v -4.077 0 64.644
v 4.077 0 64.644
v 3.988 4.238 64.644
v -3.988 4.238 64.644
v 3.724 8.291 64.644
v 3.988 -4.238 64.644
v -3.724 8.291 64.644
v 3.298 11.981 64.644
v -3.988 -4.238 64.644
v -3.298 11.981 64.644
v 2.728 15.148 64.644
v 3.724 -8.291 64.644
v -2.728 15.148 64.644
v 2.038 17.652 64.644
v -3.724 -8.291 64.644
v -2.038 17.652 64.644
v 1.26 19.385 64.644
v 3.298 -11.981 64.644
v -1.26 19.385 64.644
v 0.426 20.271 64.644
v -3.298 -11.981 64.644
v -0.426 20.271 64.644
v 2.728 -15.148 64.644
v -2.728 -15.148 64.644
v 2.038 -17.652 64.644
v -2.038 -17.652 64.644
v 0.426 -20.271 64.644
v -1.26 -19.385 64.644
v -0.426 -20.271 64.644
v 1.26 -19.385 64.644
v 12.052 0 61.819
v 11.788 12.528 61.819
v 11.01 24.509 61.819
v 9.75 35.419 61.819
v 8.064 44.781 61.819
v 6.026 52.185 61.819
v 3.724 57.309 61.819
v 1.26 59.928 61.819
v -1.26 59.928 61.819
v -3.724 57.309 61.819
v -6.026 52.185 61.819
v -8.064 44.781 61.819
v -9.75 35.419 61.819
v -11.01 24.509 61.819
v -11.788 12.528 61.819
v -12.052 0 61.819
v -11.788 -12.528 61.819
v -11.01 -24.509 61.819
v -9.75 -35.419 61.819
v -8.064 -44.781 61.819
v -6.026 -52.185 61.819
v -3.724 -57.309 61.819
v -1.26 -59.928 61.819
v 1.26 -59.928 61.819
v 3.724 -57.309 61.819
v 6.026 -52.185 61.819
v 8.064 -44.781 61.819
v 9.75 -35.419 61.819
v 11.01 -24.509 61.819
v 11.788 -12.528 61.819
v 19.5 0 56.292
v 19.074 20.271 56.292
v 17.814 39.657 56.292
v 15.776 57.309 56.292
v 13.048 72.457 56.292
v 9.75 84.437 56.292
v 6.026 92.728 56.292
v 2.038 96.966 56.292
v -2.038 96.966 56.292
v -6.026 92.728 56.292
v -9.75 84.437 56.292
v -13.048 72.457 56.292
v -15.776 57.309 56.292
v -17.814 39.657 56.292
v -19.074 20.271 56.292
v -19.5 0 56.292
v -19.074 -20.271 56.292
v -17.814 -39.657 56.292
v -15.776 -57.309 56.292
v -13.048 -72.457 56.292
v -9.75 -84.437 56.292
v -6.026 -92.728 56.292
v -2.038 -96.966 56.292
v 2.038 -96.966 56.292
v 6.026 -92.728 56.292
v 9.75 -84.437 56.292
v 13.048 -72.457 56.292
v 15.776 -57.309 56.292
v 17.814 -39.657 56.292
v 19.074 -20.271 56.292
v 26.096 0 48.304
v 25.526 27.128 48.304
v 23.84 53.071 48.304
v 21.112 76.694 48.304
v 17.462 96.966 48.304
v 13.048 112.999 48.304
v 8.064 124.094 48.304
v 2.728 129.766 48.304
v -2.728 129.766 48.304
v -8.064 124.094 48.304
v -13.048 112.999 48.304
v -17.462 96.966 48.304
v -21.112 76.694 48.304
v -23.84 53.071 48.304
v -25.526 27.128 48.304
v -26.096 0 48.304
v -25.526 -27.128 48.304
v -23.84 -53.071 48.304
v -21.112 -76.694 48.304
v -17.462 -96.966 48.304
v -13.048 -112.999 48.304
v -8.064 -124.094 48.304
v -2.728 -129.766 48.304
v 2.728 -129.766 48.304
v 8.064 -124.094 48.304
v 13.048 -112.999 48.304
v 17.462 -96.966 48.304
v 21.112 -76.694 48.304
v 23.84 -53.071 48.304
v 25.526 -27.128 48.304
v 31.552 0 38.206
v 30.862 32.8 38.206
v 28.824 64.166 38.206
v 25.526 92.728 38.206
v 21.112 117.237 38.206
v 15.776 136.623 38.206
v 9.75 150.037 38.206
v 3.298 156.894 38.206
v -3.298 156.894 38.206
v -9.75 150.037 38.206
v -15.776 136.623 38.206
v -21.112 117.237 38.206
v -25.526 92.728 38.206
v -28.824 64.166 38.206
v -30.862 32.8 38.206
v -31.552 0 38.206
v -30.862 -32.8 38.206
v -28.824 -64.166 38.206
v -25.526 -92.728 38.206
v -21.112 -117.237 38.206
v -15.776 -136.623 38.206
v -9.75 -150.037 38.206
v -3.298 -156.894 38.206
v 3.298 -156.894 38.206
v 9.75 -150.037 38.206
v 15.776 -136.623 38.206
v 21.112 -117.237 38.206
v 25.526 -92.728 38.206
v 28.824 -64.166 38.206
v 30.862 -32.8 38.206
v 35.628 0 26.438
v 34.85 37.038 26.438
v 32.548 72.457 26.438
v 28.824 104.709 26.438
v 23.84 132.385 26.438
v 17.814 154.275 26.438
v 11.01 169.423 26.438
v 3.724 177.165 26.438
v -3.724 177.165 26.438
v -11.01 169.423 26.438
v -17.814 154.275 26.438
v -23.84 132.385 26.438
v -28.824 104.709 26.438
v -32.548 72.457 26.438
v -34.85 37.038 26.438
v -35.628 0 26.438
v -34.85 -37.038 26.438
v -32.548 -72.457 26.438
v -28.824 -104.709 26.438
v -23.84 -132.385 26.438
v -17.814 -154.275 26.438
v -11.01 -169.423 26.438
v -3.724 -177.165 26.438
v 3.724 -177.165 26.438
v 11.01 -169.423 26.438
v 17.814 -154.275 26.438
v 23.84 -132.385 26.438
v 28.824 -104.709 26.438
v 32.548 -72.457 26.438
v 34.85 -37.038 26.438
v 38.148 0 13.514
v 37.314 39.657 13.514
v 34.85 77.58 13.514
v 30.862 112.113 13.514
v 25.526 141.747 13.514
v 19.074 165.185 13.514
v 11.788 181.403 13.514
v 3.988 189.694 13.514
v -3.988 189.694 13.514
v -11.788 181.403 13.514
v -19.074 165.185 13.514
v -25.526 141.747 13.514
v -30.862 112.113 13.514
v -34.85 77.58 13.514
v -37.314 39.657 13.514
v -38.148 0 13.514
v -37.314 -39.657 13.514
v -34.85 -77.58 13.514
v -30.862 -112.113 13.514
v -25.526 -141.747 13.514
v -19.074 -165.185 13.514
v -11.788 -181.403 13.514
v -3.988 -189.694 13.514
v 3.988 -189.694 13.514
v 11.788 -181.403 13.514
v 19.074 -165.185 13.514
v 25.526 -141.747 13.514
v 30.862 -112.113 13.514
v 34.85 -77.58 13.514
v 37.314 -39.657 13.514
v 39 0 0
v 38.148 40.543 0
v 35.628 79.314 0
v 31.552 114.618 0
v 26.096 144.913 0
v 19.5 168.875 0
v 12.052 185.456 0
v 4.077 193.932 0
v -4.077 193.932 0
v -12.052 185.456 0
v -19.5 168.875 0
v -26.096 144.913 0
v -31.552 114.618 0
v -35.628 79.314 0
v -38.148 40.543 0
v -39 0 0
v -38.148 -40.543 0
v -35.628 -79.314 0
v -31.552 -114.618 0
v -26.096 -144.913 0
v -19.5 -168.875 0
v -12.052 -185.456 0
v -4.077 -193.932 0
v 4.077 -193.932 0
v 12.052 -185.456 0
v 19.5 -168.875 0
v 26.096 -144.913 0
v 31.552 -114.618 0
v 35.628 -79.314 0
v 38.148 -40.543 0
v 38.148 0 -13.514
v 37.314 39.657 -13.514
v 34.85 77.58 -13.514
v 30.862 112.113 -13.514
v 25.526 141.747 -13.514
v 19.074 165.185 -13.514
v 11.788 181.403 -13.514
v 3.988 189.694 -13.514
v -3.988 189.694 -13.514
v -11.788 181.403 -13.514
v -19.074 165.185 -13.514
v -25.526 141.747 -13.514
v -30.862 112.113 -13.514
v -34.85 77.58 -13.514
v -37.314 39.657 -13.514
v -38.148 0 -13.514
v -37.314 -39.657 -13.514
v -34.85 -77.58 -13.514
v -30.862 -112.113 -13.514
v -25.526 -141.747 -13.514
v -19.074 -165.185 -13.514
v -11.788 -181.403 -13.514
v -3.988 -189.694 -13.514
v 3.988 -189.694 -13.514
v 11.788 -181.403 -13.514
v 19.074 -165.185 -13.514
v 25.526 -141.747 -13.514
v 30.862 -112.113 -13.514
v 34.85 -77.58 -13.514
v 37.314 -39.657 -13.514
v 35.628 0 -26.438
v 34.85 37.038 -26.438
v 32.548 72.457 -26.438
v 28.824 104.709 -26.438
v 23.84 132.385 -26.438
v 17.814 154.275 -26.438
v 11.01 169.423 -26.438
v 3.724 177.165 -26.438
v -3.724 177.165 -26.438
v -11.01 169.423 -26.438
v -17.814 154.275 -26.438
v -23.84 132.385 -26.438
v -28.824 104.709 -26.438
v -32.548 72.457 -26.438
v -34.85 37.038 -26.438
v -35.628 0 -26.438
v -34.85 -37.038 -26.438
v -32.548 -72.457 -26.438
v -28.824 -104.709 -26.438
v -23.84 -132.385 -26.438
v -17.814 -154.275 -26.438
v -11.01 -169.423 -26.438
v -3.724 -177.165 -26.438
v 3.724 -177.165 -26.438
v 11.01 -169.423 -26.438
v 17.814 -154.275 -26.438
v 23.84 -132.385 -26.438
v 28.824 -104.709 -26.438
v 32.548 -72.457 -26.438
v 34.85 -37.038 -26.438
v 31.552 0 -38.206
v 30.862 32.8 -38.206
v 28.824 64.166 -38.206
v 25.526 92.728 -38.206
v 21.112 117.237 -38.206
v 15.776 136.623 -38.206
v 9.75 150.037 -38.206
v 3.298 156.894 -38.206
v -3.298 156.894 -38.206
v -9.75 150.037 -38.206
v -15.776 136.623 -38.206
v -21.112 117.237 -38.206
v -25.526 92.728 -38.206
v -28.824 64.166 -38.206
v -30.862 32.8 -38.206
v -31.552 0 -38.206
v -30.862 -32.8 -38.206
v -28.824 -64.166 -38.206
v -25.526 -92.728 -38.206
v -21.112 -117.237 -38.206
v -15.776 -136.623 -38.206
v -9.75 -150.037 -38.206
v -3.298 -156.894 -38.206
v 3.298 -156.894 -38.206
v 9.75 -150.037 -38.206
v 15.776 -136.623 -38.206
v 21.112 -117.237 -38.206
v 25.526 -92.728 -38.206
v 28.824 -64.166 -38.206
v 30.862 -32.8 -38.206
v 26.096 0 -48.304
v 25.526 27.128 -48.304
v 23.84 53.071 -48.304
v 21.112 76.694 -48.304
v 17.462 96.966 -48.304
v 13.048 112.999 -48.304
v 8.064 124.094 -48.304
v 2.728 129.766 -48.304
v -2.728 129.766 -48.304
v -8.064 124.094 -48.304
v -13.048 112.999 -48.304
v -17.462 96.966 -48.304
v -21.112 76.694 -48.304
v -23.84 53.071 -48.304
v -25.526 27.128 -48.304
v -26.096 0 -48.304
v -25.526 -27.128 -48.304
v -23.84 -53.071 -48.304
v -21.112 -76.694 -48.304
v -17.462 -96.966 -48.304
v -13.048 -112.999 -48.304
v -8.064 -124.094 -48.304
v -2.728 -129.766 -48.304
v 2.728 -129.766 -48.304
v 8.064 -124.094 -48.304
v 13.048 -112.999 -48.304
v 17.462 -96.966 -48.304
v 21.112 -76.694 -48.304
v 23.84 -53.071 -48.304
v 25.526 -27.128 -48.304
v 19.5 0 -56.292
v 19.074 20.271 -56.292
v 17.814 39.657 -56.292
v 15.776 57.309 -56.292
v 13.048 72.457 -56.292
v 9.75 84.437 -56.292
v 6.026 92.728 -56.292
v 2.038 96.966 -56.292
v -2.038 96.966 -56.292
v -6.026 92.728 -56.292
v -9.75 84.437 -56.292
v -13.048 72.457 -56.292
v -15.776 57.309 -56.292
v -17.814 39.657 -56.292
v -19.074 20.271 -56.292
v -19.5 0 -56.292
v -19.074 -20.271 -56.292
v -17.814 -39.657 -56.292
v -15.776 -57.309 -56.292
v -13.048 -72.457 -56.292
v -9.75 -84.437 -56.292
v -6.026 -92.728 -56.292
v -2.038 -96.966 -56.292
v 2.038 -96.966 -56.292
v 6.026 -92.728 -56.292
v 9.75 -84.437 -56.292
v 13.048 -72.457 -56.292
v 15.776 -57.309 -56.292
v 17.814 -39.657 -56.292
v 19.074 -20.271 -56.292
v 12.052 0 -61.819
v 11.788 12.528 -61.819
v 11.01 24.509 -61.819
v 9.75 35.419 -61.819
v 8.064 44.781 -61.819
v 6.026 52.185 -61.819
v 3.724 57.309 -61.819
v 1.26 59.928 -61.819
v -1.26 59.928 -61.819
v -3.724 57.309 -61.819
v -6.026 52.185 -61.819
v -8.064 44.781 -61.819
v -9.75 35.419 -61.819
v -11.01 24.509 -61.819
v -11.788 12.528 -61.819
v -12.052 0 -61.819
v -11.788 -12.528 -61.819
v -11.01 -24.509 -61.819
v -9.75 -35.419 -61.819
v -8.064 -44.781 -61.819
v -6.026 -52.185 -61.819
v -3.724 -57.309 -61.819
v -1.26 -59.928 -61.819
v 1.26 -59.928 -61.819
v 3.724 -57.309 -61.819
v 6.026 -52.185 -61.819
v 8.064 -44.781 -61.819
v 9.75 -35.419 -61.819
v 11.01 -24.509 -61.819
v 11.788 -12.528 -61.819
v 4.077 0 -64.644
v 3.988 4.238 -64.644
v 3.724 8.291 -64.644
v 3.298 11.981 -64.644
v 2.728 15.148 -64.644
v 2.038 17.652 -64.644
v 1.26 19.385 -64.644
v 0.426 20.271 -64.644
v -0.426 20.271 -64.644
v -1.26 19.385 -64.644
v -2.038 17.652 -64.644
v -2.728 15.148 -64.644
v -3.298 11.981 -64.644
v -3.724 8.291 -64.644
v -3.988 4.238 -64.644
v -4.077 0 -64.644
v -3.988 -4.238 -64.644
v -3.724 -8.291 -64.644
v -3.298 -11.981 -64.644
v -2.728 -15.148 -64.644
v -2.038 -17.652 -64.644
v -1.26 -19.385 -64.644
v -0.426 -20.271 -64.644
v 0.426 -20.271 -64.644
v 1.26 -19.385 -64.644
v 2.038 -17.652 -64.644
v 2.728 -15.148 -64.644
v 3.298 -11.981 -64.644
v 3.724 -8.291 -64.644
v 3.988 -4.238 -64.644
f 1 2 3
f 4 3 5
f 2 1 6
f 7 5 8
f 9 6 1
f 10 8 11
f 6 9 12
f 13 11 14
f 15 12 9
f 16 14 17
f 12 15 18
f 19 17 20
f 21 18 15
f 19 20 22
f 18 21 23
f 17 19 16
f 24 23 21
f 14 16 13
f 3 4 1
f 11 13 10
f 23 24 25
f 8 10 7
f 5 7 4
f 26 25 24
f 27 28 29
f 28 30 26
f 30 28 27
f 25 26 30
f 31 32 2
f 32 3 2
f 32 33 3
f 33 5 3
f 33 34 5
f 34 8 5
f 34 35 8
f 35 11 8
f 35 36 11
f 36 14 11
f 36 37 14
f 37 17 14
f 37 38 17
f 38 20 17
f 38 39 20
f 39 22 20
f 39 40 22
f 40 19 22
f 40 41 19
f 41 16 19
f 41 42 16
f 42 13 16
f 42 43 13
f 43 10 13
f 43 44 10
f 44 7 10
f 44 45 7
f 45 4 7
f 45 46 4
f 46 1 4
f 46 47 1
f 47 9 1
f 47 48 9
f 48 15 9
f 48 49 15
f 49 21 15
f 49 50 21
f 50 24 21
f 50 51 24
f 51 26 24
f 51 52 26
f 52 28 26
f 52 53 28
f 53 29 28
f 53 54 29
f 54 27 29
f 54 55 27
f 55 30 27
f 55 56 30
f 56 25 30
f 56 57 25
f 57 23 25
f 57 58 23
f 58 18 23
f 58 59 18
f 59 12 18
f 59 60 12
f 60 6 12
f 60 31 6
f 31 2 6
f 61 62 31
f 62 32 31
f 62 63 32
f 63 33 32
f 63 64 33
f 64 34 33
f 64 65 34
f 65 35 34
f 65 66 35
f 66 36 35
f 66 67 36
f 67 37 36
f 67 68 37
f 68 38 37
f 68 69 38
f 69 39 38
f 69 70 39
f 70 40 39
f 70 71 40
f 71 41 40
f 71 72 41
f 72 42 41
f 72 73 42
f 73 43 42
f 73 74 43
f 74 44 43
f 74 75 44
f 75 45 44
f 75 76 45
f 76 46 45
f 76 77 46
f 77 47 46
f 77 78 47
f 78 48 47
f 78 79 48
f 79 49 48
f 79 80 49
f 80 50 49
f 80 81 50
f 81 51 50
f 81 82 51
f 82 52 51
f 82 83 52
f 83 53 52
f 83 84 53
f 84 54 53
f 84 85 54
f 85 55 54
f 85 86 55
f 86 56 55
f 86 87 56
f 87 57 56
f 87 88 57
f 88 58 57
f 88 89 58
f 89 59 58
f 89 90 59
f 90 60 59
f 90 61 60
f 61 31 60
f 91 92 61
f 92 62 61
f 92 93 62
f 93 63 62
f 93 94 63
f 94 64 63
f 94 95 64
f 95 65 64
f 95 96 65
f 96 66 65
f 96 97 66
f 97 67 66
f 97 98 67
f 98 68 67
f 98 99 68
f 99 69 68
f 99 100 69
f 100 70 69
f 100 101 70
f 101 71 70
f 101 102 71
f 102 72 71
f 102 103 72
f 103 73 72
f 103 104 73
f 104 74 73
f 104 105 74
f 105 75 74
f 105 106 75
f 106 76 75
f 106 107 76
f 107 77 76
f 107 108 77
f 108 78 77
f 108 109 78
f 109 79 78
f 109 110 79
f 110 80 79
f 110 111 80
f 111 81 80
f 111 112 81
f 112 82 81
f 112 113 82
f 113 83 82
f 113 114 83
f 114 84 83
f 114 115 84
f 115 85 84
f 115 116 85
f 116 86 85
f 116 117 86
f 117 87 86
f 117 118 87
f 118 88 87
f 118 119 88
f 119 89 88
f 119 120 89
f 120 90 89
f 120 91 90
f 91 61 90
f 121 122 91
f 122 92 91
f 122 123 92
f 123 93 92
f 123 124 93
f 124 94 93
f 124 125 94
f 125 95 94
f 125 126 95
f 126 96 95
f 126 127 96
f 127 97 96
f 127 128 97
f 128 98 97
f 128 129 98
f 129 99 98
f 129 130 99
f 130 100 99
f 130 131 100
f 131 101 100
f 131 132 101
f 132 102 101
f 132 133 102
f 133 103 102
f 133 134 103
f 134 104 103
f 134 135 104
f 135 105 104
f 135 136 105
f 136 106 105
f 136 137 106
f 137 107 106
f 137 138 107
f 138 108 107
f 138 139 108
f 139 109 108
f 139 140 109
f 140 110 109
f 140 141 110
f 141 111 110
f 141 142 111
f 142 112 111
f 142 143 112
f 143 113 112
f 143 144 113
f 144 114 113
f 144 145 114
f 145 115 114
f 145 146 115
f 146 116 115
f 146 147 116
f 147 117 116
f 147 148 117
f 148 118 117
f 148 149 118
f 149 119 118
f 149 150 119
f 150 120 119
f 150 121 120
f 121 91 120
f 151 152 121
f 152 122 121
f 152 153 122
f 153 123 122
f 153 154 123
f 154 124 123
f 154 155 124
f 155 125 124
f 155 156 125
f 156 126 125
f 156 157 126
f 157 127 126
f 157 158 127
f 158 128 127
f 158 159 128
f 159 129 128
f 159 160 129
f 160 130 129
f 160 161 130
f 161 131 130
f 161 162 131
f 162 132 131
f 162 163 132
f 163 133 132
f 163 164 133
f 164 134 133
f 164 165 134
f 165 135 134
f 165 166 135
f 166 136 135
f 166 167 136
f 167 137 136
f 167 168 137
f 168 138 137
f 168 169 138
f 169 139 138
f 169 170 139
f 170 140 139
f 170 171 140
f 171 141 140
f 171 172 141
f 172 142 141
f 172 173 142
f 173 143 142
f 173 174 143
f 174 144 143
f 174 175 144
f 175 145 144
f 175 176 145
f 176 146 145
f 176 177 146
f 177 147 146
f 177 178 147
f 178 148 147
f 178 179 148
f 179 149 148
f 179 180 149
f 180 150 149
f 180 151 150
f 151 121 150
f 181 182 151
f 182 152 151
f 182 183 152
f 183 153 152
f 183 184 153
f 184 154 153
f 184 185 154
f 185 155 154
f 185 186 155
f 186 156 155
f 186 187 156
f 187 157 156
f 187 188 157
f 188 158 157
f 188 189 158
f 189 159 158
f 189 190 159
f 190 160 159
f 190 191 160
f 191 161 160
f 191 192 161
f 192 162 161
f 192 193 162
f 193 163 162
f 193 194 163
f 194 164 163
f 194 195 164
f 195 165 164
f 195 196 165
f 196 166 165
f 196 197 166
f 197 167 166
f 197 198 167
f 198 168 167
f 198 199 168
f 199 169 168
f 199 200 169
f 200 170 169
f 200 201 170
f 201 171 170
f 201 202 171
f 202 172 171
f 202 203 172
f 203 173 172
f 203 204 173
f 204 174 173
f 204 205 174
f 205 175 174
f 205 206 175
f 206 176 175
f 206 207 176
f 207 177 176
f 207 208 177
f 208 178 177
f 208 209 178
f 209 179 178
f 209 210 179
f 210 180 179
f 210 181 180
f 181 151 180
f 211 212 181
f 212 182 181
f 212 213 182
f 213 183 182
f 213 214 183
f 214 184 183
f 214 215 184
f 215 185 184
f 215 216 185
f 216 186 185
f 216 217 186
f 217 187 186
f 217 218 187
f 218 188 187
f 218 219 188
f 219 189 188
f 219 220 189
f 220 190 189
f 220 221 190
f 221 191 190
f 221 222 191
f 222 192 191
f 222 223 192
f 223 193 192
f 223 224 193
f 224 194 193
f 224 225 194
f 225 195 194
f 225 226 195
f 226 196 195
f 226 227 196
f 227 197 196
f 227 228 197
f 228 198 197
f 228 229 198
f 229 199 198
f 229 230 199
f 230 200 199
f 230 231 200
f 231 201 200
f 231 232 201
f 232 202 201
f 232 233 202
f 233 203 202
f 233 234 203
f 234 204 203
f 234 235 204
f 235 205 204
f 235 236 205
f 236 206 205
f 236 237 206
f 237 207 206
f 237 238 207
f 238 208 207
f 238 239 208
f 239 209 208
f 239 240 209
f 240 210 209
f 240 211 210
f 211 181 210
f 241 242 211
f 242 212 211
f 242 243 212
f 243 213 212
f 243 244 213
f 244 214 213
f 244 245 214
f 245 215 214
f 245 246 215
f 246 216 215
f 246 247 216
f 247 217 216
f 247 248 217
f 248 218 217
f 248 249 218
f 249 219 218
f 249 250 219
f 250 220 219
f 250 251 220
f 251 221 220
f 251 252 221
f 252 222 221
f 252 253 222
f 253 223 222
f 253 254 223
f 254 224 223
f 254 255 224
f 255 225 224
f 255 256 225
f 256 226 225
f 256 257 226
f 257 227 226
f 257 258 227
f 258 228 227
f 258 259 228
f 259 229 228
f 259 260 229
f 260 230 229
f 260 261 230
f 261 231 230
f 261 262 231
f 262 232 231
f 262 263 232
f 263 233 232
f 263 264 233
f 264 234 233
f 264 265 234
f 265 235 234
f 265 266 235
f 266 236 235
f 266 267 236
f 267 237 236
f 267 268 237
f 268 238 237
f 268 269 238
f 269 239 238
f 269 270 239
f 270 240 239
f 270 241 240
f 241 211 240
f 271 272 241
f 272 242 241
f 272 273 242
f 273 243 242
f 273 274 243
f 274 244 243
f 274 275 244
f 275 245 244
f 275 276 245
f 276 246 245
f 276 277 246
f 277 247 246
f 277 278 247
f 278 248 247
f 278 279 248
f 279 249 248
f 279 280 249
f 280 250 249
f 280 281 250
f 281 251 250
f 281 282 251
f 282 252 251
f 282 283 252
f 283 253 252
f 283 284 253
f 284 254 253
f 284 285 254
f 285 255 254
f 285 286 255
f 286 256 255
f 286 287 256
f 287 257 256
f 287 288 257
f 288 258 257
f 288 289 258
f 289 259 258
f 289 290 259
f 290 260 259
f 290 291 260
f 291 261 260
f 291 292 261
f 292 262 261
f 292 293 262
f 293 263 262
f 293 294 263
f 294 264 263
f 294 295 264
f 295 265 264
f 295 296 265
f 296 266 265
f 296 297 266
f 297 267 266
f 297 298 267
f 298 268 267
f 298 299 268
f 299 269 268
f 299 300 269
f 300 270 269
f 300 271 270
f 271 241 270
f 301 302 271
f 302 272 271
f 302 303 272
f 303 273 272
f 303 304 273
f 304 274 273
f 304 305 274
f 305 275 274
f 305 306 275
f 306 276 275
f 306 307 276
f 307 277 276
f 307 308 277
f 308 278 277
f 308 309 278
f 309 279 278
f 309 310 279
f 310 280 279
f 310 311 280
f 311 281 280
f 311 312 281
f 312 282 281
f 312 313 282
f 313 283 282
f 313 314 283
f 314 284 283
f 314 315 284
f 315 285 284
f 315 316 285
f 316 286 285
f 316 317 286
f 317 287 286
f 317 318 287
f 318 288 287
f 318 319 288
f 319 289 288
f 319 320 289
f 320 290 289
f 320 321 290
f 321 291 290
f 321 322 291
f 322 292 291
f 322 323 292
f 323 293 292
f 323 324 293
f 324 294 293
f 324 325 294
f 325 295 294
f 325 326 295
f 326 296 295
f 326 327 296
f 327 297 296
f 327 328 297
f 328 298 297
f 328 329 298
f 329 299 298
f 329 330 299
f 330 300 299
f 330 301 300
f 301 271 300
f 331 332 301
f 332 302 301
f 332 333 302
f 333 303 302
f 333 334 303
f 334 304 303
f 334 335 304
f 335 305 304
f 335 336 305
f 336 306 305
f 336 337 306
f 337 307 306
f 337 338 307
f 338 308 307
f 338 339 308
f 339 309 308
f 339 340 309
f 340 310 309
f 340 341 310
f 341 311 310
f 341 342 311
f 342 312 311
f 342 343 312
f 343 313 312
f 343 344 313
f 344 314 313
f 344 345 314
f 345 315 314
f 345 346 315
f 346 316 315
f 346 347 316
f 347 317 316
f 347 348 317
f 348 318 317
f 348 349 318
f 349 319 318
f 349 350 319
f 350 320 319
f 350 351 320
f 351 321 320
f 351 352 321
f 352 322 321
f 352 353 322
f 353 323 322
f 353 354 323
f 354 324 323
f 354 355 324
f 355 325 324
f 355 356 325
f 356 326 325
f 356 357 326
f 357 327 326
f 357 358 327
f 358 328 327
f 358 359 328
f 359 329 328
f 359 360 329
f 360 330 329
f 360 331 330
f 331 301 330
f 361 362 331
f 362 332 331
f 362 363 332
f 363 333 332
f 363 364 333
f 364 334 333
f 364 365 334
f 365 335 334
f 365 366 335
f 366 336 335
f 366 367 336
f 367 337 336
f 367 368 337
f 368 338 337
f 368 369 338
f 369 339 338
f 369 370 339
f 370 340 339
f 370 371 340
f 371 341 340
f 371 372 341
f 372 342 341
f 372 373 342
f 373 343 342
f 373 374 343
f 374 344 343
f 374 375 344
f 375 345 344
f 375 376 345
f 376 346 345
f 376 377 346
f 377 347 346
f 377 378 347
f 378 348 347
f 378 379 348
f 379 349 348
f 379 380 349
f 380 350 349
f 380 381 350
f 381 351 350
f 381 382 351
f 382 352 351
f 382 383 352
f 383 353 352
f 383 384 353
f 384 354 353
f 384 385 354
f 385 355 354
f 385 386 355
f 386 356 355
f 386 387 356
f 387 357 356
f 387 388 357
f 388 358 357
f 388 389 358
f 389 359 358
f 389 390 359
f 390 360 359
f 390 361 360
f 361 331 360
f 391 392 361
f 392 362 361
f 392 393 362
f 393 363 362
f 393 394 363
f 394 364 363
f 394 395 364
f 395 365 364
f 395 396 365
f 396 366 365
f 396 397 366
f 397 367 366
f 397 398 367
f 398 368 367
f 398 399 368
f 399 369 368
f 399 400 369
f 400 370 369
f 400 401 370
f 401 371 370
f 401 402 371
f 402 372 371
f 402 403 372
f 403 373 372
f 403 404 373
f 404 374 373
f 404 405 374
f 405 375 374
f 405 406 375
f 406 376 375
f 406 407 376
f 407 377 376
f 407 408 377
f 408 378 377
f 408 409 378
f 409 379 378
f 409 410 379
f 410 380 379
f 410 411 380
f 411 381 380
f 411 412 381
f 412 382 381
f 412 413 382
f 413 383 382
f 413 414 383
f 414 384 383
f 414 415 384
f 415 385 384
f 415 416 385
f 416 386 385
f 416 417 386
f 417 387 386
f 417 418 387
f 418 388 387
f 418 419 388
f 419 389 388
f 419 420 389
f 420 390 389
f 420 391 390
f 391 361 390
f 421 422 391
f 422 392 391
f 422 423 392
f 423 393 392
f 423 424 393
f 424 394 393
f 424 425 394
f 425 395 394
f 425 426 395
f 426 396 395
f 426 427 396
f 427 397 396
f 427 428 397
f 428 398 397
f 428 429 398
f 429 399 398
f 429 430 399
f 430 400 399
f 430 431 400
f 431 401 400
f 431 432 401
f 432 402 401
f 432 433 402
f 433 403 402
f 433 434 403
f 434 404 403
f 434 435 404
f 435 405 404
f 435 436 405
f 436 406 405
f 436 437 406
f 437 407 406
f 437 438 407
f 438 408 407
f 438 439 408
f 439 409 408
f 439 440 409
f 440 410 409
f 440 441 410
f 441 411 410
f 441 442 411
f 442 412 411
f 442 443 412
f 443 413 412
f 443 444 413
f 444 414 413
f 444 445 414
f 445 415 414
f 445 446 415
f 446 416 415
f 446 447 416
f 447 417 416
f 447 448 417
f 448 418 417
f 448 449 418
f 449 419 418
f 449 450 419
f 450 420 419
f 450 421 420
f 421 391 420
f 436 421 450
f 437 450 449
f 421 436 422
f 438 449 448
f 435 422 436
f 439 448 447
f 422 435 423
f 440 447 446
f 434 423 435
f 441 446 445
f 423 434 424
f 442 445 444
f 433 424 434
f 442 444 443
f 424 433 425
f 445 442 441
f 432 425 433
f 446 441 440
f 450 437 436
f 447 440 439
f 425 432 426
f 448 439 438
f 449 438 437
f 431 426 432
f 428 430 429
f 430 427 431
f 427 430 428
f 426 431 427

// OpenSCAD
// Generated by SolidPython 1.0.1 on 2020-07-29 00:46:45


scale(v = [3, 15, 5]) {
	sphere(r = 13);
}
/***********************************************
*********      SolidPython code:      **********
************************************************
 
# import packages: SolidPython
from solid import *
from solid.utils import *
from itertools import chain, combinations, permutations


class Resize:

    def __init__(self, scad_file):
        self.scad_file = scad_file
        #self.scad_file = import_scad(scad_file)
        # cone/cylinder param:
        self.r1 = 0
        self.r2 = 0
        self.h = 0
        # rectangular prism param:
        self.w = 0
        self.l = 0
        # ellipse param:
        self.r = 0

    # import OpenScad code (file name corresponds to shape)


    # classify shape + parameters
    def assign(self, param1, param2, param3):
        if self.scad_file == 'cone.scad':
            self.r1 = param1
            self.r2 = param2
            self.h = param3
        elif self.scad_file == 'cylinder.scad':
            self.r1 = param1
            self.r2 = param2
            self.h = param3
        elif self.scad_file == 'rectangularPrism.scad':
            self.h = param1
            self.l = param2
            self.w = param3
        else:
            self.r = param1
            self.h = param2

    # resize parameters
    def iterate(self):
        x = range(3, 20, 2)
        i = 1
        if self.scad_file == 'cone.scad':
            tempList = list(permutations(x, 2))
            for temp in tempList:
                param1 = temp[0]
                param2 = temp[1]
                filepath = 'produced_scad_files/' + 'cone' + str(param1) + '_' + str(param2) + '_' + '.scad'
                scad_render_to_file(cylinder(h=param1, r1=param2, r2=0), filepath)

        elif self.scad_file == 'cylinder.scad':
            tempList = list(permutations(x, 3))
            for temp in tempList:
                param1 = temp[0]
                param2 = temp[1]
                filepath = 'produced_scad_files/' + 'cylinder' + str(param1) + '_' + str(param2) + '_' + '.scad'
                scad_render_to_file(cylinder(h=param1, r1=param2, r2=param2), filepath)

        elif self.scad_file == 'rectangularPrism.scad':
            tempList = list(permutations(x, 3))
            for temp in tempList:
                param1 = temp[0]
                param2 = temp[1]
                param3 = temp[2]
                filepath = 'produced_scad_files/' + 'rectangularPrism' + str(param1) + '_' + str(param2) + '_' + str(
                    param3) + '.scad'
                scad_render_to_file(cube(size=(param1, param2, param3)), filepath)

        elif self.scad_file == 'ellipse.scad':
            tempList = list(permutations(x, 4))
            for temp in tempList:
                param1 = temp[0]
                param2 = temp[1]
                param3 = temp[2]
                param4 = temp[3]
                filepath = 'produced_scad_files/' + 'ellipse' + str(param1) + '_' + str(param2) + '_' + str(param3) + '_' + str(param4) + '.scad'
                scad_render_to_file(scale([param1, param2, param3])(sphere(r=param4)), filepath)

    def render_to_scadfile(self):
        scad_render_to_file(scad, 'example.scad') 
 
************************************************/
